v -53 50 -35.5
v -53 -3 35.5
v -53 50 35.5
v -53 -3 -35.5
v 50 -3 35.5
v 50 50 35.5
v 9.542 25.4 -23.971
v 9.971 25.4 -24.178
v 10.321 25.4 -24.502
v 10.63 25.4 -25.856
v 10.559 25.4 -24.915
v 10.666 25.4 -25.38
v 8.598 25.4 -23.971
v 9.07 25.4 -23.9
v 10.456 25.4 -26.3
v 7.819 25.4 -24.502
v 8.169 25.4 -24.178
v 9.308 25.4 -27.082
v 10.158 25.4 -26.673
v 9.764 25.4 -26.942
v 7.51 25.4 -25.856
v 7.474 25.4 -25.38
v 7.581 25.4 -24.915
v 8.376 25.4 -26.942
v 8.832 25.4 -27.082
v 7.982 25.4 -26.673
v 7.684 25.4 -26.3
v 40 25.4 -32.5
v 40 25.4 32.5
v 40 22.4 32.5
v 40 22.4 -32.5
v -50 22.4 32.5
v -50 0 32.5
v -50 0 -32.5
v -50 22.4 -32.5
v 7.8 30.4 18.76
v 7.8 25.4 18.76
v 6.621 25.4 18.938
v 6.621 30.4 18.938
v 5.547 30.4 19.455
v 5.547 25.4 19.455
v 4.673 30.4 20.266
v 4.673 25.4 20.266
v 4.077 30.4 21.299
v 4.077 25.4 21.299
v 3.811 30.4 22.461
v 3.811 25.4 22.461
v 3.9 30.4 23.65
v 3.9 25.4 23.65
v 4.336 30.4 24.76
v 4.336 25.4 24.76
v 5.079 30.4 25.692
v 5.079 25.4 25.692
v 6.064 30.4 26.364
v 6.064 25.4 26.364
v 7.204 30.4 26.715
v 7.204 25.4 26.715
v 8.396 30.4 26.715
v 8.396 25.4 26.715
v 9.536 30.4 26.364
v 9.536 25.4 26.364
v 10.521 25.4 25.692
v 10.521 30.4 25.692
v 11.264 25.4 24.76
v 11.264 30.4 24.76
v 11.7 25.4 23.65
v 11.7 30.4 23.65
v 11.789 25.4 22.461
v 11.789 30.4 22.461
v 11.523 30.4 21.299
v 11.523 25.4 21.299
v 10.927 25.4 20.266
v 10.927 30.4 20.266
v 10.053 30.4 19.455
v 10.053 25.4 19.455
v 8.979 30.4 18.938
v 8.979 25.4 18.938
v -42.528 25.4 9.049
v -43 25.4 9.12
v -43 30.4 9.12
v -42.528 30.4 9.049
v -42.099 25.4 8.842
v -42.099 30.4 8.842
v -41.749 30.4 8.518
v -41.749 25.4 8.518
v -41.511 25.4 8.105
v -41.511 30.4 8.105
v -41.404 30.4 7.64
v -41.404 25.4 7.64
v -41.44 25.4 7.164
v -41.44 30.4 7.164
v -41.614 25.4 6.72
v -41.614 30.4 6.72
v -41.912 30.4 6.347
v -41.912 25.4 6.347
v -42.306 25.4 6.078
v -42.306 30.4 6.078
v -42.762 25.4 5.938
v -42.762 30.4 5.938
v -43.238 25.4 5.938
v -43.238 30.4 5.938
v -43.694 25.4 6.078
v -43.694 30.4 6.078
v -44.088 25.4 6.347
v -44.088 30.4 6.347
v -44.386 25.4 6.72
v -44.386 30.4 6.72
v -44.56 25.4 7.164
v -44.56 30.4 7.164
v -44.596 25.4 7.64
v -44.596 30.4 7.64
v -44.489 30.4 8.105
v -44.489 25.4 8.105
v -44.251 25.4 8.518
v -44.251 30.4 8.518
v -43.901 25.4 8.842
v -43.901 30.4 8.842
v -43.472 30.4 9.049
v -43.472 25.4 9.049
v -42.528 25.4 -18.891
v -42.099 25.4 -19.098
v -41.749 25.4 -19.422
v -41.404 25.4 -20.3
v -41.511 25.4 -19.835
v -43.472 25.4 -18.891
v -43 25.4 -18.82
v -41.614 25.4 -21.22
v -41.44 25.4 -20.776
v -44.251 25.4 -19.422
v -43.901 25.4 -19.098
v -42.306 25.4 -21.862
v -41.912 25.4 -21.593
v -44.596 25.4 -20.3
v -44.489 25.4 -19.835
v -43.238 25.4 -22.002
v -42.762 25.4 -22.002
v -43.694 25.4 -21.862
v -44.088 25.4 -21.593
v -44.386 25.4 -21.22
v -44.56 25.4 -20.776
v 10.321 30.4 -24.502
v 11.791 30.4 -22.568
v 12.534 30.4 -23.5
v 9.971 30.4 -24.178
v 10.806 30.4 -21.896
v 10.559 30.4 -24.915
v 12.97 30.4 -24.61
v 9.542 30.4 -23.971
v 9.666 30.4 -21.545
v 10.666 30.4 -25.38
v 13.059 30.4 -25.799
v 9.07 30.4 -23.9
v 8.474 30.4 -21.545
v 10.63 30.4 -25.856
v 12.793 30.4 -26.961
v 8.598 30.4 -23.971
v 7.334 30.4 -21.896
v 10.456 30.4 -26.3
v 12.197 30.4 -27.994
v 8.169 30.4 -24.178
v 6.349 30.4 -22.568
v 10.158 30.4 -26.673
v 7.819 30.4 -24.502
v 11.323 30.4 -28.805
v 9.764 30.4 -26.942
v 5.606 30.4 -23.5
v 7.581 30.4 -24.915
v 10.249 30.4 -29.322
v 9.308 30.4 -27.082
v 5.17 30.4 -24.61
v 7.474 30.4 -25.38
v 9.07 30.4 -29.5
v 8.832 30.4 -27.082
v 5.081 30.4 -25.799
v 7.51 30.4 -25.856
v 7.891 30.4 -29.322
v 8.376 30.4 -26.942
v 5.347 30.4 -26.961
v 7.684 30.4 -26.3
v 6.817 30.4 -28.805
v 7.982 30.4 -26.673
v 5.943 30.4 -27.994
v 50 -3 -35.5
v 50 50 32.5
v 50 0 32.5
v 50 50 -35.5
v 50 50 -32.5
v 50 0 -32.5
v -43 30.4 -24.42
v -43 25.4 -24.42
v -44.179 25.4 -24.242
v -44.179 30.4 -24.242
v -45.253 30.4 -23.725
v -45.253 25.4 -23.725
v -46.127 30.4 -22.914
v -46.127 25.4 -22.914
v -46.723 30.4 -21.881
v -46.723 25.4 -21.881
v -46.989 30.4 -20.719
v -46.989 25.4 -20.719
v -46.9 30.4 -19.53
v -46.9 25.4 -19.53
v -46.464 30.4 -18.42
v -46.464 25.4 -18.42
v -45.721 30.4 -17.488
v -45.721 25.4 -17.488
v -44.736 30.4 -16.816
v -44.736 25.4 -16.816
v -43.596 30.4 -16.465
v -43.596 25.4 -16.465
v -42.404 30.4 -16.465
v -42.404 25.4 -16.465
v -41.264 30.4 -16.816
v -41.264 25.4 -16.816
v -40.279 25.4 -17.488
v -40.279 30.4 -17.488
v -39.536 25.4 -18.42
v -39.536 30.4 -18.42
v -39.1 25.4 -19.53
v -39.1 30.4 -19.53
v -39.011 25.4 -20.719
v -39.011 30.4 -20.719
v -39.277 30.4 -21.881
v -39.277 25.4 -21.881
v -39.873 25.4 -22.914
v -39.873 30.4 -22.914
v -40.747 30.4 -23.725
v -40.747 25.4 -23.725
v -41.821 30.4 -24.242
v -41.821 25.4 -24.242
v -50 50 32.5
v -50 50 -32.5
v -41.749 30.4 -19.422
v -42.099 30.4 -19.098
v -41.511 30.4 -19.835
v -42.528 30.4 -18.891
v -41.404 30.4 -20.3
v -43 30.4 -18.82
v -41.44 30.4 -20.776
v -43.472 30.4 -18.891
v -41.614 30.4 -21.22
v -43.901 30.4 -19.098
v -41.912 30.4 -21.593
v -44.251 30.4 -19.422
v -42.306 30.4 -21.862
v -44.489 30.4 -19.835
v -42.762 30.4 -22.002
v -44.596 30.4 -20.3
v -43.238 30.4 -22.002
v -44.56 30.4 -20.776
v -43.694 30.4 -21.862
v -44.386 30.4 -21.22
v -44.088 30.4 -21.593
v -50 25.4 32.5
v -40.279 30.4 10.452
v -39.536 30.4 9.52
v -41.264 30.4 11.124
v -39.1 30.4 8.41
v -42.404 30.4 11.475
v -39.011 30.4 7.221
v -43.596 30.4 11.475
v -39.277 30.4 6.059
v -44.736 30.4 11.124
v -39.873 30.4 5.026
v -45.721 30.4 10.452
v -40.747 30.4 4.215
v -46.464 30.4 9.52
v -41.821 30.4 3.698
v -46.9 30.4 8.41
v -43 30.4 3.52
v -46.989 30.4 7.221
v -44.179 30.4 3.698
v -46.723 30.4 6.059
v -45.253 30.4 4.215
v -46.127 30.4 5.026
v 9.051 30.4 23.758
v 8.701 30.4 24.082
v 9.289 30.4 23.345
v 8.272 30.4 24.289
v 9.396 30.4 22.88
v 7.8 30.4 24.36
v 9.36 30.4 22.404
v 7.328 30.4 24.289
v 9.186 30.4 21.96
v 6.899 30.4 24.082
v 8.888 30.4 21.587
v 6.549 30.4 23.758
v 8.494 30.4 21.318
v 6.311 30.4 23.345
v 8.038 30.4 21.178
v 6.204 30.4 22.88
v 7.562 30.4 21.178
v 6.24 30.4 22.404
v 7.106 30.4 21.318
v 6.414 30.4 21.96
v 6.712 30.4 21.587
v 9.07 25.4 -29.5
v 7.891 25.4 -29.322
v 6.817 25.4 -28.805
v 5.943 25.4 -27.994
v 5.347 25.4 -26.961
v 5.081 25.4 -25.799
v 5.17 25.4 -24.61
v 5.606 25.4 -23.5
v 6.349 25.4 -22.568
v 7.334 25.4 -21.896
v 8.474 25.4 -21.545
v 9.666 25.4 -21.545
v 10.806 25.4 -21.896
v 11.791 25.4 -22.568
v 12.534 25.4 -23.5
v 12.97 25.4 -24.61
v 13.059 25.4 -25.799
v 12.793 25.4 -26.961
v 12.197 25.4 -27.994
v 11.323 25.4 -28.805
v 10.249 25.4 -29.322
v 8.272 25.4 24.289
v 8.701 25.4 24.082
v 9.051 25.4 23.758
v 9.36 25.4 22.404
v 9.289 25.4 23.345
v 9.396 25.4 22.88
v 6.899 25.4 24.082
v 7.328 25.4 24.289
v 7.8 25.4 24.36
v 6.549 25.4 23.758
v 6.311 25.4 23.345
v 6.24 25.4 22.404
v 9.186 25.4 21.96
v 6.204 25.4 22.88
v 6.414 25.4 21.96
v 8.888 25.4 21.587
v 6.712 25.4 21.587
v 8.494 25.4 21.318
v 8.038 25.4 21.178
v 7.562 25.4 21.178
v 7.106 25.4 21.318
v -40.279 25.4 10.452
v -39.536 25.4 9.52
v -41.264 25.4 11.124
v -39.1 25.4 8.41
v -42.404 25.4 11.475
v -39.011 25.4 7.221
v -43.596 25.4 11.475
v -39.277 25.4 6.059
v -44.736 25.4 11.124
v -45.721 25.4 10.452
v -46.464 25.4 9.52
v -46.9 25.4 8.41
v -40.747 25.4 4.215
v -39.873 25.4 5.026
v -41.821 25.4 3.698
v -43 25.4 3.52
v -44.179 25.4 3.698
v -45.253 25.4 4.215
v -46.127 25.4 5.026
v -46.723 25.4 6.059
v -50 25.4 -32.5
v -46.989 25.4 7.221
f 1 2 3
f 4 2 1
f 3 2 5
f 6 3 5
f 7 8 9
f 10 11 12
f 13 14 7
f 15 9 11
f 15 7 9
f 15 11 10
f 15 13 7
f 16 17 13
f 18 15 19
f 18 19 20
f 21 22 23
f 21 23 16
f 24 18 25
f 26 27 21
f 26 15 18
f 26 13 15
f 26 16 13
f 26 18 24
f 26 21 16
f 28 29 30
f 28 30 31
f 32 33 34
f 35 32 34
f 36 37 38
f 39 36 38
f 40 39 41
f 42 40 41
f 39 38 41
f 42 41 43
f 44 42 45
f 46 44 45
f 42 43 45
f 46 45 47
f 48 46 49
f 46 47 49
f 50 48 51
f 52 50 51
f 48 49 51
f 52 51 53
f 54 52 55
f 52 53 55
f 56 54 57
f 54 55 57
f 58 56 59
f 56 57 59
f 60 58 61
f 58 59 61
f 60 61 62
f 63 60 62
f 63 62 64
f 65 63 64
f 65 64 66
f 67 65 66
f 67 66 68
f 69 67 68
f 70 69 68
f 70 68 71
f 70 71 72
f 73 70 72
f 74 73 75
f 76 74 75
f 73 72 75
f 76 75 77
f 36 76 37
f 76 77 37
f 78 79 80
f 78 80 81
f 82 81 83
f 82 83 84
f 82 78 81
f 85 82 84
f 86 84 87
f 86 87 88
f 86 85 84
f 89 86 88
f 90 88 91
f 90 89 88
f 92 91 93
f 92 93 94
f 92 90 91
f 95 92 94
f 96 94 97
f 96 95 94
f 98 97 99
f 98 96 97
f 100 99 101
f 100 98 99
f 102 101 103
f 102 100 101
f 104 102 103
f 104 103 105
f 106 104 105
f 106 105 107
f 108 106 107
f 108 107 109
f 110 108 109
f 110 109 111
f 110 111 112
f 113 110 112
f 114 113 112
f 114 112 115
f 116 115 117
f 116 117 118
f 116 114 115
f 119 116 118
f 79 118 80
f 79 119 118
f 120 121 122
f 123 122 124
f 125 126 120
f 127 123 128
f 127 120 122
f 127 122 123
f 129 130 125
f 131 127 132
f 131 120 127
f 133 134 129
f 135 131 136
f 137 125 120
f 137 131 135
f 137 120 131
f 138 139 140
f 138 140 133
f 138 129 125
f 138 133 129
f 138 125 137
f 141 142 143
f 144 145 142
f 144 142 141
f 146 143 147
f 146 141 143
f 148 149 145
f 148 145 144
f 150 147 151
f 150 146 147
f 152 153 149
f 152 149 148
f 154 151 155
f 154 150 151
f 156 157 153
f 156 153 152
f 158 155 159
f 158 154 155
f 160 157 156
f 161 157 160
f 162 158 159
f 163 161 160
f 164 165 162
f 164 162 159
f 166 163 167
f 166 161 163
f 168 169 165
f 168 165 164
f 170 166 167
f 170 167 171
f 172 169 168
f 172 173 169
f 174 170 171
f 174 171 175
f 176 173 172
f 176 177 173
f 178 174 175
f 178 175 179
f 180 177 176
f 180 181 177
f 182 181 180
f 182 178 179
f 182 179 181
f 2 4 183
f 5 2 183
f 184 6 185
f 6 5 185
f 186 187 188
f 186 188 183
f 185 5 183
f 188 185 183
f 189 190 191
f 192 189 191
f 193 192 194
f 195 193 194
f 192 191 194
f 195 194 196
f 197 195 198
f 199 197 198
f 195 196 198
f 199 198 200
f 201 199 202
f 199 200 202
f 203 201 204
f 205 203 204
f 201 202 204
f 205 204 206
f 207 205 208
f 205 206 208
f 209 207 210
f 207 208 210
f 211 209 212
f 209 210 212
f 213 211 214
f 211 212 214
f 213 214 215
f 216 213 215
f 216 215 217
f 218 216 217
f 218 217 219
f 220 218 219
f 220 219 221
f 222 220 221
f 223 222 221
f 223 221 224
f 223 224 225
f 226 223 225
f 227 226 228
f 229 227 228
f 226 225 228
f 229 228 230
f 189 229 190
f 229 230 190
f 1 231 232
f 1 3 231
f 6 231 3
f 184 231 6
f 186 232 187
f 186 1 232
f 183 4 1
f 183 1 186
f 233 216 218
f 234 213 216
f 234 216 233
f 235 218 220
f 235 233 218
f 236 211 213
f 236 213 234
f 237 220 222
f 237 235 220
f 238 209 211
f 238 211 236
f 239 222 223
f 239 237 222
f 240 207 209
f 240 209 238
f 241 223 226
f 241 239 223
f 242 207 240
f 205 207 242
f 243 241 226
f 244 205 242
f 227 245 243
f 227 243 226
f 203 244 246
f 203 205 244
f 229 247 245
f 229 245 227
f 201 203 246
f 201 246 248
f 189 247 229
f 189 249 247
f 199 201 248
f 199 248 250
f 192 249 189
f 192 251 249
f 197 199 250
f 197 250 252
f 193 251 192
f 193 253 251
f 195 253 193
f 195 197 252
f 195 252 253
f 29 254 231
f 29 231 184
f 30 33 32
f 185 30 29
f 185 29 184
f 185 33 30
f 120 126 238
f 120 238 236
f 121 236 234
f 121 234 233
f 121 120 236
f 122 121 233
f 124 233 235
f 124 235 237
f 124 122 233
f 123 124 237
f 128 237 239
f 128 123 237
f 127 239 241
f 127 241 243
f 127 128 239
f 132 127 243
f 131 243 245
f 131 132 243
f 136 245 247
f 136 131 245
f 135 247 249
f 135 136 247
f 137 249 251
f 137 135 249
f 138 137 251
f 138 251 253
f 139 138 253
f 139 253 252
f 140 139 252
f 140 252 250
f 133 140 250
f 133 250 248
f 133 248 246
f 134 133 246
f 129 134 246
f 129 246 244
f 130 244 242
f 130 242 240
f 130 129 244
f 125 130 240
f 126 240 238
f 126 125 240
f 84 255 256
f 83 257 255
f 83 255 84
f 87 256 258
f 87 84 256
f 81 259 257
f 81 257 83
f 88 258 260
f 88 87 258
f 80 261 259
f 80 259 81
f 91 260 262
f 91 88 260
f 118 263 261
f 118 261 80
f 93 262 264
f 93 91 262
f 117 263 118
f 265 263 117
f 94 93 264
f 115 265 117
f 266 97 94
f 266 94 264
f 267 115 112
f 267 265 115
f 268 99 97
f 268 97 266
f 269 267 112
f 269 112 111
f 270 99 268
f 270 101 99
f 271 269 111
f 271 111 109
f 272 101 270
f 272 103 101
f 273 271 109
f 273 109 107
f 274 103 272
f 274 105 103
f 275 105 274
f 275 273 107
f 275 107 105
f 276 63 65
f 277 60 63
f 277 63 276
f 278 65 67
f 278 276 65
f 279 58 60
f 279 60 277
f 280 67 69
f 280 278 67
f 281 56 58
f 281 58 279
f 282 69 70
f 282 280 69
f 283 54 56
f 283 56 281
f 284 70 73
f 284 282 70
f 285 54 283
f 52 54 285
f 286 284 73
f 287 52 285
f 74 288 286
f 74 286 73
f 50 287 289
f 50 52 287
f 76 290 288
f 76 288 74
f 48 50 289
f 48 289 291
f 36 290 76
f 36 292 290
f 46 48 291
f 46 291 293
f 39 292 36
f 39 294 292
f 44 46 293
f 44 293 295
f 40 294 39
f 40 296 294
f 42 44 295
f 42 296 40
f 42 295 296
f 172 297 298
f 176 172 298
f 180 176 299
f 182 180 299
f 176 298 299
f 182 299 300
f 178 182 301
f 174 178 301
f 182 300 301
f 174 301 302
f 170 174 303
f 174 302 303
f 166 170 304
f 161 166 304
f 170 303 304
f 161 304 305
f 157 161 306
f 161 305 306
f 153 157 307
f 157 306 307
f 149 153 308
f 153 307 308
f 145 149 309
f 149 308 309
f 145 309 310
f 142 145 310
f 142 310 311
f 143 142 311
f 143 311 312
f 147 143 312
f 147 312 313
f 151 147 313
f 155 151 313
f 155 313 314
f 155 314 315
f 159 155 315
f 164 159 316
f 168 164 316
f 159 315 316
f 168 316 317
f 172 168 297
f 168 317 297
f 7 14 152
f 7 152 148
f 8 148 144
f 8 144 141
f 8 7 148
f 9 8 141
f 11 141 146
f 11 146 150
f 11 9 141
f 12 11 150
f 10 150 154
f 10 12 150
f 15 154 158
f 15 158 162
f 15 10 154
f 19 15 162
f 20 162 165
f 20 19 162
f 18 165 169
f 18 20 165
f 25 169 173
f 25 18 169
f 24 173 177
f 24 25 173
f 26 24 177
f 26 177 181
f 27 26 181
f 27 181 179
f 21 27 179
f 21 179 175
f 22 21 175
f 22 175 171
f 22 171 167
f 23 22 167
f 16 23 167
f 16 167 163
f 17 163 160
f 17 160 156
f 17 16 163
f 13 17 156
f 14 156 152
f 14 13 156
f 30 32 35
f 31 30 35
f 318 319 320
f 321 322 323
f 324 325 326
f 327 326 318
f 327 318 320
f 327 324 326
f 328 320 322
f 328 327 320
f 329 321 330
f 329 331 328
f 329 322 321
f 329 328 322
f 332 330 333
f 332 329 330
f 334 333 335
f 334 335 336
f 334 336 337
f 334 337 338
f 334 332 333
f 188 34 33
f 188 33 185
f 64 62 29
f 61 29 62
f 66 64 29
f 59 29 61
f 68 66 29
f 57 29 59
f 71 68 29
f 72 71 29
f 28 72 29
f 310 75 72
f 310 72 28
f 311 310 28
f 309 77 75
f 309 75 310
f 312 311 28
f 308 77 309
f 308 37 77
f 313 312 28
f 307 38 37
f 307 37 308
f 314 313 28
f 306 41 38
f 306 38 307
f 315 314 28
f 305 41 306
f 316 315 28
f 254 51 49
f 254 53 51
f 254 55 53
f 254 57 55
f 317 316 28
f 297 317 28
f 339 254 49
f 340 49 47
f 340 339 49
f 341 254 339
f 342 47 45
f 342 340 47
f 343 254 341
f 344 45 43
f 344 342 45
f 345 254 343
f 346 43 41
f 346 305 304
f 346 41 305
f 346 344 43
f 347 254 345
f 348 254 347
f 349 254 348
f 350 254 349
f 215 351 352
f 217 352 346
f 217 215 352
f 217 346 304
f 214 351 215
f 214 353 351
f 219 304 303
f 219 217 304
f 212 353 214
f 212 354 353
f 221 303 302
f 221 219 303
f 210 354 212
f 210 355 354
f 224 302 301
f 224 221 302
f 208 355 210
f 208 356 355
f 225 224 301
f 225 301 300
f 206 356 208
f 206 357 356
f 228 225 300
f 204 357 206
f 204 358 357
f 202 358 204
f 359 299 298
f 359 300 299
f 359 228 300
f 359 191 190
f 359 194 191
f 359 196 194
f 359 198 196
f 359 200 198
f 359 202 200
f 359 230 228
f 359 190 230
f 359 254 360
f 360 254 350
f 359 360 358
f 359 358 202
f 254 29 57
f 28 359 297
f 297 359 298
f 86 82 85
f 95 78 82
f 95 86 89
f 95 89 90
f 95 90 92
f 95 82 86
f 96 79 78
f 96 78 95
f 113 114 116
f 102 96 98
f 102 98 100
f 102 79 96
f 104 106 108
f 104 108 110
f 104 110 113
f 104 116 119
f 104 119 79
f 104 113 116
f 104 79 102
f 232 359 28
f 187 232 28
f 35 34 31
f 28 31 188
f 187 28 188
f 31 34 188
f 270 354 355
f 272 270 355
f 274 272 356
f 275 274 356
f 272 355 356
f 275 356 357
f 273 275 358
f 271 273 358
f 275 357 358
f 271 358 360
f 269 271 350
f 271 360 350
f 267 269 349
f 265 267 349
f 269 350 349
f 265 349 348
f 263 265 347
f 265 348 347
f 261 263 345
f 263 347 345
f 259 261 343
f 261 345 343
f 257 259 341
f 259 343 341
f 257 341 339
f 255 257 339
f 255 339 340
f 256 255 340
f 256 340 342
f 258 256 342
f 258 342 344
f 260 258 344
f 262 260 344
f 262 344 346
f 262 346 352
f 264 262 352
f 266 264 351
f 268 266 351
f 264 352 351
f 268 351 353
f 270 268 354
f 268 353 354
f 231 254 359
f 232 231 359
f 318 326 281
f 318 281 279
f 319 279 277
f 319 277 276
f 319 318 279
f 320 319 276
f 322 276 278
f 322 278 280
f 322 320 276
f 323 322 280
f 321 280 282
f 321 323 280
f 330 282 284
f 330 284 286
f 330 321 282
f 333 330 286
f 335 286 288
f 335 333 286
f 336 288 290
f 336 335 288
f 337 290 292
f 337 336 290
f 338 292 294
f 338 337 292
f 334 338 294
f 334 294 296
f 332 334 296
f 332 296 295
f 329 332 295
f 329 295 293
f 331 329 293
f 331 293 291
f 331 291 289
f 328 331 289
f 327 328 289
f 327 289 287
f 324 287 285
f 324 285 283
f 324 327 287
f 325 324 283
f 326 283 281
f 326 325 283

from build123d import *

# Parameters (mm, degrees)
SKETCH2_W           = 100
SKETCH2_H           = 65
BOSS_EXTRUDE1_DEPTH = 50
SHELL1_T            = 3
SKETCH7_W           = 65
SKETCH7_H           = 3
BOSS_EXTRUDE3_DEPTH = 100
CUT_EXTRUDE1_REACH  = 71.827
SKETCH3_W           = 10
SKETCH3_H           = 65
SKETCH4_R           = 4
SKETCH4_R_2         = 1.6
BOSS_EXTRUDE4_DEPTH = 5


with BuildPart() as part:
    # Sketch2 → Boss-Extrude1 (new body)
    with BuildSketch(Plane(origin=(0, 0, 0), x_dir=(1, 0, 0), z_dir=(0, 1, 0))):
        Rectangle(SKETCH2_W, SKETCH2_H)
    extrude(amount=BOSS_EXTRUDE1_DEPTH)

    # Shell1
    shell1_openings = [part.faces().sort_by_distance(p)[0] for p in [
        (50, 25, 0),
        (0, 50, 0),
    ]]
    offset(amount=SHELL1_T, openings=shell1_openings, kind=Kind.INTERSECTION)

    # Sketch7 → Boss-Extrude3 (add)
    with BuildSketch(Plane(origin=(-50, 0, 0), x_dir=(0, 0, -1), z_dir=(1, 0, 0))):
        with Locations((0, 23.9)):
            Rectangle(SKETCH7_W, SKETCH7_H)
    extrude(amount=BOSS_EXTRUDE3_DEPTH)

    # Sketch3 → Cut-Extrude1 (cut, up to next)
    with BuildSketch(Plane(origin=(0, 25.4, 0), x_dir=(1, 0, 0), z_dir=(0, 1, 0)), mode=Mode.PRIVATE) as cut_extrude1_sk1:
        with Locations((45, 0)):
            Rectangle(SKETCH3_W, SKETCH3_H)
    cut_extrude1_tool1 = extrude(cut_extrude1_sk1.sketch, amount=-CUT_EXTRUDE1_REACH, mode=Mode.PRIVATE) & part.part
    add(cut_extrude1_tool1.solids().sort_by_distance((45, 25.4, 0))[0], mode=Mode.SUBTRACT)

    # Sketch4 → Boss-Extrude4 (add)
    # profile 1 of 4: a face of its own
    with BuildSketch(Plane(origin=(0, 25.4, 0), x_dir=(1, 0, 0), z_dir=(0, 1, 0))):
        with Locations(Location((9.07, 25.5, 0), (0, 0, 90))):
            Circle(SKETCH4_R)
        with Locations(Location((9.07, 25.5, 0), (0, 0, 270))):
            Circle(SKETCH4_R_2, mode=Mode.SUBTRACT)
    # profile 2 of 4: a face of its own
    with BuildSketch(Plane(origin=(0, 25.4, 0), x_dir=(1, 0, 0), z_dir=(0, 1, 0))):
        with Locations(Location((7.8, -22.76, 0), (0, 0, 90))):
            Circle(SKETCH4_R)
        with Locations(Location((7.8, -22.76, 0), (0, 0, 270))):
            Circle(SKETCH4_R_2, mode=Mode.SUBTRACT)
    # profile 3 of 4: a face of its own
    with BuildSketch(Plane(origin=(0, 25.4, 0), x_dir=(1, 0, 0), z_dir=(0, 1, 0))):
        with Locations(Location((-43, -7.52, 0), (0, 0, 90))):
            Circle(SKETCH4_R)
        with Locations(Location((-43, -7.52, 0), (0, 0, 270))):
            Circle(SKETCH4_R_2, mode=Mode.SUBTRACT)
    # profile 4 of 4: a face of its own
    with BuildSketch(Plane(origin=(0, 25.4, 0), x_dir=(1, 0, 0), z_dir=(0, 1, 0))):
        with Locations(Location((-43, 20.42, 0), (0, 0, 90))):
            Circle(SKETCH4_R)
        with Locations(Location((-43, 20.42, 0), (0, 0, 270))):
            Circle(SKETCH4_R_2, mode=Mode.SUBTRACT)
    extrude(amount=BOSS_EXTRUDE4_DEPTH)


solid = part.part
